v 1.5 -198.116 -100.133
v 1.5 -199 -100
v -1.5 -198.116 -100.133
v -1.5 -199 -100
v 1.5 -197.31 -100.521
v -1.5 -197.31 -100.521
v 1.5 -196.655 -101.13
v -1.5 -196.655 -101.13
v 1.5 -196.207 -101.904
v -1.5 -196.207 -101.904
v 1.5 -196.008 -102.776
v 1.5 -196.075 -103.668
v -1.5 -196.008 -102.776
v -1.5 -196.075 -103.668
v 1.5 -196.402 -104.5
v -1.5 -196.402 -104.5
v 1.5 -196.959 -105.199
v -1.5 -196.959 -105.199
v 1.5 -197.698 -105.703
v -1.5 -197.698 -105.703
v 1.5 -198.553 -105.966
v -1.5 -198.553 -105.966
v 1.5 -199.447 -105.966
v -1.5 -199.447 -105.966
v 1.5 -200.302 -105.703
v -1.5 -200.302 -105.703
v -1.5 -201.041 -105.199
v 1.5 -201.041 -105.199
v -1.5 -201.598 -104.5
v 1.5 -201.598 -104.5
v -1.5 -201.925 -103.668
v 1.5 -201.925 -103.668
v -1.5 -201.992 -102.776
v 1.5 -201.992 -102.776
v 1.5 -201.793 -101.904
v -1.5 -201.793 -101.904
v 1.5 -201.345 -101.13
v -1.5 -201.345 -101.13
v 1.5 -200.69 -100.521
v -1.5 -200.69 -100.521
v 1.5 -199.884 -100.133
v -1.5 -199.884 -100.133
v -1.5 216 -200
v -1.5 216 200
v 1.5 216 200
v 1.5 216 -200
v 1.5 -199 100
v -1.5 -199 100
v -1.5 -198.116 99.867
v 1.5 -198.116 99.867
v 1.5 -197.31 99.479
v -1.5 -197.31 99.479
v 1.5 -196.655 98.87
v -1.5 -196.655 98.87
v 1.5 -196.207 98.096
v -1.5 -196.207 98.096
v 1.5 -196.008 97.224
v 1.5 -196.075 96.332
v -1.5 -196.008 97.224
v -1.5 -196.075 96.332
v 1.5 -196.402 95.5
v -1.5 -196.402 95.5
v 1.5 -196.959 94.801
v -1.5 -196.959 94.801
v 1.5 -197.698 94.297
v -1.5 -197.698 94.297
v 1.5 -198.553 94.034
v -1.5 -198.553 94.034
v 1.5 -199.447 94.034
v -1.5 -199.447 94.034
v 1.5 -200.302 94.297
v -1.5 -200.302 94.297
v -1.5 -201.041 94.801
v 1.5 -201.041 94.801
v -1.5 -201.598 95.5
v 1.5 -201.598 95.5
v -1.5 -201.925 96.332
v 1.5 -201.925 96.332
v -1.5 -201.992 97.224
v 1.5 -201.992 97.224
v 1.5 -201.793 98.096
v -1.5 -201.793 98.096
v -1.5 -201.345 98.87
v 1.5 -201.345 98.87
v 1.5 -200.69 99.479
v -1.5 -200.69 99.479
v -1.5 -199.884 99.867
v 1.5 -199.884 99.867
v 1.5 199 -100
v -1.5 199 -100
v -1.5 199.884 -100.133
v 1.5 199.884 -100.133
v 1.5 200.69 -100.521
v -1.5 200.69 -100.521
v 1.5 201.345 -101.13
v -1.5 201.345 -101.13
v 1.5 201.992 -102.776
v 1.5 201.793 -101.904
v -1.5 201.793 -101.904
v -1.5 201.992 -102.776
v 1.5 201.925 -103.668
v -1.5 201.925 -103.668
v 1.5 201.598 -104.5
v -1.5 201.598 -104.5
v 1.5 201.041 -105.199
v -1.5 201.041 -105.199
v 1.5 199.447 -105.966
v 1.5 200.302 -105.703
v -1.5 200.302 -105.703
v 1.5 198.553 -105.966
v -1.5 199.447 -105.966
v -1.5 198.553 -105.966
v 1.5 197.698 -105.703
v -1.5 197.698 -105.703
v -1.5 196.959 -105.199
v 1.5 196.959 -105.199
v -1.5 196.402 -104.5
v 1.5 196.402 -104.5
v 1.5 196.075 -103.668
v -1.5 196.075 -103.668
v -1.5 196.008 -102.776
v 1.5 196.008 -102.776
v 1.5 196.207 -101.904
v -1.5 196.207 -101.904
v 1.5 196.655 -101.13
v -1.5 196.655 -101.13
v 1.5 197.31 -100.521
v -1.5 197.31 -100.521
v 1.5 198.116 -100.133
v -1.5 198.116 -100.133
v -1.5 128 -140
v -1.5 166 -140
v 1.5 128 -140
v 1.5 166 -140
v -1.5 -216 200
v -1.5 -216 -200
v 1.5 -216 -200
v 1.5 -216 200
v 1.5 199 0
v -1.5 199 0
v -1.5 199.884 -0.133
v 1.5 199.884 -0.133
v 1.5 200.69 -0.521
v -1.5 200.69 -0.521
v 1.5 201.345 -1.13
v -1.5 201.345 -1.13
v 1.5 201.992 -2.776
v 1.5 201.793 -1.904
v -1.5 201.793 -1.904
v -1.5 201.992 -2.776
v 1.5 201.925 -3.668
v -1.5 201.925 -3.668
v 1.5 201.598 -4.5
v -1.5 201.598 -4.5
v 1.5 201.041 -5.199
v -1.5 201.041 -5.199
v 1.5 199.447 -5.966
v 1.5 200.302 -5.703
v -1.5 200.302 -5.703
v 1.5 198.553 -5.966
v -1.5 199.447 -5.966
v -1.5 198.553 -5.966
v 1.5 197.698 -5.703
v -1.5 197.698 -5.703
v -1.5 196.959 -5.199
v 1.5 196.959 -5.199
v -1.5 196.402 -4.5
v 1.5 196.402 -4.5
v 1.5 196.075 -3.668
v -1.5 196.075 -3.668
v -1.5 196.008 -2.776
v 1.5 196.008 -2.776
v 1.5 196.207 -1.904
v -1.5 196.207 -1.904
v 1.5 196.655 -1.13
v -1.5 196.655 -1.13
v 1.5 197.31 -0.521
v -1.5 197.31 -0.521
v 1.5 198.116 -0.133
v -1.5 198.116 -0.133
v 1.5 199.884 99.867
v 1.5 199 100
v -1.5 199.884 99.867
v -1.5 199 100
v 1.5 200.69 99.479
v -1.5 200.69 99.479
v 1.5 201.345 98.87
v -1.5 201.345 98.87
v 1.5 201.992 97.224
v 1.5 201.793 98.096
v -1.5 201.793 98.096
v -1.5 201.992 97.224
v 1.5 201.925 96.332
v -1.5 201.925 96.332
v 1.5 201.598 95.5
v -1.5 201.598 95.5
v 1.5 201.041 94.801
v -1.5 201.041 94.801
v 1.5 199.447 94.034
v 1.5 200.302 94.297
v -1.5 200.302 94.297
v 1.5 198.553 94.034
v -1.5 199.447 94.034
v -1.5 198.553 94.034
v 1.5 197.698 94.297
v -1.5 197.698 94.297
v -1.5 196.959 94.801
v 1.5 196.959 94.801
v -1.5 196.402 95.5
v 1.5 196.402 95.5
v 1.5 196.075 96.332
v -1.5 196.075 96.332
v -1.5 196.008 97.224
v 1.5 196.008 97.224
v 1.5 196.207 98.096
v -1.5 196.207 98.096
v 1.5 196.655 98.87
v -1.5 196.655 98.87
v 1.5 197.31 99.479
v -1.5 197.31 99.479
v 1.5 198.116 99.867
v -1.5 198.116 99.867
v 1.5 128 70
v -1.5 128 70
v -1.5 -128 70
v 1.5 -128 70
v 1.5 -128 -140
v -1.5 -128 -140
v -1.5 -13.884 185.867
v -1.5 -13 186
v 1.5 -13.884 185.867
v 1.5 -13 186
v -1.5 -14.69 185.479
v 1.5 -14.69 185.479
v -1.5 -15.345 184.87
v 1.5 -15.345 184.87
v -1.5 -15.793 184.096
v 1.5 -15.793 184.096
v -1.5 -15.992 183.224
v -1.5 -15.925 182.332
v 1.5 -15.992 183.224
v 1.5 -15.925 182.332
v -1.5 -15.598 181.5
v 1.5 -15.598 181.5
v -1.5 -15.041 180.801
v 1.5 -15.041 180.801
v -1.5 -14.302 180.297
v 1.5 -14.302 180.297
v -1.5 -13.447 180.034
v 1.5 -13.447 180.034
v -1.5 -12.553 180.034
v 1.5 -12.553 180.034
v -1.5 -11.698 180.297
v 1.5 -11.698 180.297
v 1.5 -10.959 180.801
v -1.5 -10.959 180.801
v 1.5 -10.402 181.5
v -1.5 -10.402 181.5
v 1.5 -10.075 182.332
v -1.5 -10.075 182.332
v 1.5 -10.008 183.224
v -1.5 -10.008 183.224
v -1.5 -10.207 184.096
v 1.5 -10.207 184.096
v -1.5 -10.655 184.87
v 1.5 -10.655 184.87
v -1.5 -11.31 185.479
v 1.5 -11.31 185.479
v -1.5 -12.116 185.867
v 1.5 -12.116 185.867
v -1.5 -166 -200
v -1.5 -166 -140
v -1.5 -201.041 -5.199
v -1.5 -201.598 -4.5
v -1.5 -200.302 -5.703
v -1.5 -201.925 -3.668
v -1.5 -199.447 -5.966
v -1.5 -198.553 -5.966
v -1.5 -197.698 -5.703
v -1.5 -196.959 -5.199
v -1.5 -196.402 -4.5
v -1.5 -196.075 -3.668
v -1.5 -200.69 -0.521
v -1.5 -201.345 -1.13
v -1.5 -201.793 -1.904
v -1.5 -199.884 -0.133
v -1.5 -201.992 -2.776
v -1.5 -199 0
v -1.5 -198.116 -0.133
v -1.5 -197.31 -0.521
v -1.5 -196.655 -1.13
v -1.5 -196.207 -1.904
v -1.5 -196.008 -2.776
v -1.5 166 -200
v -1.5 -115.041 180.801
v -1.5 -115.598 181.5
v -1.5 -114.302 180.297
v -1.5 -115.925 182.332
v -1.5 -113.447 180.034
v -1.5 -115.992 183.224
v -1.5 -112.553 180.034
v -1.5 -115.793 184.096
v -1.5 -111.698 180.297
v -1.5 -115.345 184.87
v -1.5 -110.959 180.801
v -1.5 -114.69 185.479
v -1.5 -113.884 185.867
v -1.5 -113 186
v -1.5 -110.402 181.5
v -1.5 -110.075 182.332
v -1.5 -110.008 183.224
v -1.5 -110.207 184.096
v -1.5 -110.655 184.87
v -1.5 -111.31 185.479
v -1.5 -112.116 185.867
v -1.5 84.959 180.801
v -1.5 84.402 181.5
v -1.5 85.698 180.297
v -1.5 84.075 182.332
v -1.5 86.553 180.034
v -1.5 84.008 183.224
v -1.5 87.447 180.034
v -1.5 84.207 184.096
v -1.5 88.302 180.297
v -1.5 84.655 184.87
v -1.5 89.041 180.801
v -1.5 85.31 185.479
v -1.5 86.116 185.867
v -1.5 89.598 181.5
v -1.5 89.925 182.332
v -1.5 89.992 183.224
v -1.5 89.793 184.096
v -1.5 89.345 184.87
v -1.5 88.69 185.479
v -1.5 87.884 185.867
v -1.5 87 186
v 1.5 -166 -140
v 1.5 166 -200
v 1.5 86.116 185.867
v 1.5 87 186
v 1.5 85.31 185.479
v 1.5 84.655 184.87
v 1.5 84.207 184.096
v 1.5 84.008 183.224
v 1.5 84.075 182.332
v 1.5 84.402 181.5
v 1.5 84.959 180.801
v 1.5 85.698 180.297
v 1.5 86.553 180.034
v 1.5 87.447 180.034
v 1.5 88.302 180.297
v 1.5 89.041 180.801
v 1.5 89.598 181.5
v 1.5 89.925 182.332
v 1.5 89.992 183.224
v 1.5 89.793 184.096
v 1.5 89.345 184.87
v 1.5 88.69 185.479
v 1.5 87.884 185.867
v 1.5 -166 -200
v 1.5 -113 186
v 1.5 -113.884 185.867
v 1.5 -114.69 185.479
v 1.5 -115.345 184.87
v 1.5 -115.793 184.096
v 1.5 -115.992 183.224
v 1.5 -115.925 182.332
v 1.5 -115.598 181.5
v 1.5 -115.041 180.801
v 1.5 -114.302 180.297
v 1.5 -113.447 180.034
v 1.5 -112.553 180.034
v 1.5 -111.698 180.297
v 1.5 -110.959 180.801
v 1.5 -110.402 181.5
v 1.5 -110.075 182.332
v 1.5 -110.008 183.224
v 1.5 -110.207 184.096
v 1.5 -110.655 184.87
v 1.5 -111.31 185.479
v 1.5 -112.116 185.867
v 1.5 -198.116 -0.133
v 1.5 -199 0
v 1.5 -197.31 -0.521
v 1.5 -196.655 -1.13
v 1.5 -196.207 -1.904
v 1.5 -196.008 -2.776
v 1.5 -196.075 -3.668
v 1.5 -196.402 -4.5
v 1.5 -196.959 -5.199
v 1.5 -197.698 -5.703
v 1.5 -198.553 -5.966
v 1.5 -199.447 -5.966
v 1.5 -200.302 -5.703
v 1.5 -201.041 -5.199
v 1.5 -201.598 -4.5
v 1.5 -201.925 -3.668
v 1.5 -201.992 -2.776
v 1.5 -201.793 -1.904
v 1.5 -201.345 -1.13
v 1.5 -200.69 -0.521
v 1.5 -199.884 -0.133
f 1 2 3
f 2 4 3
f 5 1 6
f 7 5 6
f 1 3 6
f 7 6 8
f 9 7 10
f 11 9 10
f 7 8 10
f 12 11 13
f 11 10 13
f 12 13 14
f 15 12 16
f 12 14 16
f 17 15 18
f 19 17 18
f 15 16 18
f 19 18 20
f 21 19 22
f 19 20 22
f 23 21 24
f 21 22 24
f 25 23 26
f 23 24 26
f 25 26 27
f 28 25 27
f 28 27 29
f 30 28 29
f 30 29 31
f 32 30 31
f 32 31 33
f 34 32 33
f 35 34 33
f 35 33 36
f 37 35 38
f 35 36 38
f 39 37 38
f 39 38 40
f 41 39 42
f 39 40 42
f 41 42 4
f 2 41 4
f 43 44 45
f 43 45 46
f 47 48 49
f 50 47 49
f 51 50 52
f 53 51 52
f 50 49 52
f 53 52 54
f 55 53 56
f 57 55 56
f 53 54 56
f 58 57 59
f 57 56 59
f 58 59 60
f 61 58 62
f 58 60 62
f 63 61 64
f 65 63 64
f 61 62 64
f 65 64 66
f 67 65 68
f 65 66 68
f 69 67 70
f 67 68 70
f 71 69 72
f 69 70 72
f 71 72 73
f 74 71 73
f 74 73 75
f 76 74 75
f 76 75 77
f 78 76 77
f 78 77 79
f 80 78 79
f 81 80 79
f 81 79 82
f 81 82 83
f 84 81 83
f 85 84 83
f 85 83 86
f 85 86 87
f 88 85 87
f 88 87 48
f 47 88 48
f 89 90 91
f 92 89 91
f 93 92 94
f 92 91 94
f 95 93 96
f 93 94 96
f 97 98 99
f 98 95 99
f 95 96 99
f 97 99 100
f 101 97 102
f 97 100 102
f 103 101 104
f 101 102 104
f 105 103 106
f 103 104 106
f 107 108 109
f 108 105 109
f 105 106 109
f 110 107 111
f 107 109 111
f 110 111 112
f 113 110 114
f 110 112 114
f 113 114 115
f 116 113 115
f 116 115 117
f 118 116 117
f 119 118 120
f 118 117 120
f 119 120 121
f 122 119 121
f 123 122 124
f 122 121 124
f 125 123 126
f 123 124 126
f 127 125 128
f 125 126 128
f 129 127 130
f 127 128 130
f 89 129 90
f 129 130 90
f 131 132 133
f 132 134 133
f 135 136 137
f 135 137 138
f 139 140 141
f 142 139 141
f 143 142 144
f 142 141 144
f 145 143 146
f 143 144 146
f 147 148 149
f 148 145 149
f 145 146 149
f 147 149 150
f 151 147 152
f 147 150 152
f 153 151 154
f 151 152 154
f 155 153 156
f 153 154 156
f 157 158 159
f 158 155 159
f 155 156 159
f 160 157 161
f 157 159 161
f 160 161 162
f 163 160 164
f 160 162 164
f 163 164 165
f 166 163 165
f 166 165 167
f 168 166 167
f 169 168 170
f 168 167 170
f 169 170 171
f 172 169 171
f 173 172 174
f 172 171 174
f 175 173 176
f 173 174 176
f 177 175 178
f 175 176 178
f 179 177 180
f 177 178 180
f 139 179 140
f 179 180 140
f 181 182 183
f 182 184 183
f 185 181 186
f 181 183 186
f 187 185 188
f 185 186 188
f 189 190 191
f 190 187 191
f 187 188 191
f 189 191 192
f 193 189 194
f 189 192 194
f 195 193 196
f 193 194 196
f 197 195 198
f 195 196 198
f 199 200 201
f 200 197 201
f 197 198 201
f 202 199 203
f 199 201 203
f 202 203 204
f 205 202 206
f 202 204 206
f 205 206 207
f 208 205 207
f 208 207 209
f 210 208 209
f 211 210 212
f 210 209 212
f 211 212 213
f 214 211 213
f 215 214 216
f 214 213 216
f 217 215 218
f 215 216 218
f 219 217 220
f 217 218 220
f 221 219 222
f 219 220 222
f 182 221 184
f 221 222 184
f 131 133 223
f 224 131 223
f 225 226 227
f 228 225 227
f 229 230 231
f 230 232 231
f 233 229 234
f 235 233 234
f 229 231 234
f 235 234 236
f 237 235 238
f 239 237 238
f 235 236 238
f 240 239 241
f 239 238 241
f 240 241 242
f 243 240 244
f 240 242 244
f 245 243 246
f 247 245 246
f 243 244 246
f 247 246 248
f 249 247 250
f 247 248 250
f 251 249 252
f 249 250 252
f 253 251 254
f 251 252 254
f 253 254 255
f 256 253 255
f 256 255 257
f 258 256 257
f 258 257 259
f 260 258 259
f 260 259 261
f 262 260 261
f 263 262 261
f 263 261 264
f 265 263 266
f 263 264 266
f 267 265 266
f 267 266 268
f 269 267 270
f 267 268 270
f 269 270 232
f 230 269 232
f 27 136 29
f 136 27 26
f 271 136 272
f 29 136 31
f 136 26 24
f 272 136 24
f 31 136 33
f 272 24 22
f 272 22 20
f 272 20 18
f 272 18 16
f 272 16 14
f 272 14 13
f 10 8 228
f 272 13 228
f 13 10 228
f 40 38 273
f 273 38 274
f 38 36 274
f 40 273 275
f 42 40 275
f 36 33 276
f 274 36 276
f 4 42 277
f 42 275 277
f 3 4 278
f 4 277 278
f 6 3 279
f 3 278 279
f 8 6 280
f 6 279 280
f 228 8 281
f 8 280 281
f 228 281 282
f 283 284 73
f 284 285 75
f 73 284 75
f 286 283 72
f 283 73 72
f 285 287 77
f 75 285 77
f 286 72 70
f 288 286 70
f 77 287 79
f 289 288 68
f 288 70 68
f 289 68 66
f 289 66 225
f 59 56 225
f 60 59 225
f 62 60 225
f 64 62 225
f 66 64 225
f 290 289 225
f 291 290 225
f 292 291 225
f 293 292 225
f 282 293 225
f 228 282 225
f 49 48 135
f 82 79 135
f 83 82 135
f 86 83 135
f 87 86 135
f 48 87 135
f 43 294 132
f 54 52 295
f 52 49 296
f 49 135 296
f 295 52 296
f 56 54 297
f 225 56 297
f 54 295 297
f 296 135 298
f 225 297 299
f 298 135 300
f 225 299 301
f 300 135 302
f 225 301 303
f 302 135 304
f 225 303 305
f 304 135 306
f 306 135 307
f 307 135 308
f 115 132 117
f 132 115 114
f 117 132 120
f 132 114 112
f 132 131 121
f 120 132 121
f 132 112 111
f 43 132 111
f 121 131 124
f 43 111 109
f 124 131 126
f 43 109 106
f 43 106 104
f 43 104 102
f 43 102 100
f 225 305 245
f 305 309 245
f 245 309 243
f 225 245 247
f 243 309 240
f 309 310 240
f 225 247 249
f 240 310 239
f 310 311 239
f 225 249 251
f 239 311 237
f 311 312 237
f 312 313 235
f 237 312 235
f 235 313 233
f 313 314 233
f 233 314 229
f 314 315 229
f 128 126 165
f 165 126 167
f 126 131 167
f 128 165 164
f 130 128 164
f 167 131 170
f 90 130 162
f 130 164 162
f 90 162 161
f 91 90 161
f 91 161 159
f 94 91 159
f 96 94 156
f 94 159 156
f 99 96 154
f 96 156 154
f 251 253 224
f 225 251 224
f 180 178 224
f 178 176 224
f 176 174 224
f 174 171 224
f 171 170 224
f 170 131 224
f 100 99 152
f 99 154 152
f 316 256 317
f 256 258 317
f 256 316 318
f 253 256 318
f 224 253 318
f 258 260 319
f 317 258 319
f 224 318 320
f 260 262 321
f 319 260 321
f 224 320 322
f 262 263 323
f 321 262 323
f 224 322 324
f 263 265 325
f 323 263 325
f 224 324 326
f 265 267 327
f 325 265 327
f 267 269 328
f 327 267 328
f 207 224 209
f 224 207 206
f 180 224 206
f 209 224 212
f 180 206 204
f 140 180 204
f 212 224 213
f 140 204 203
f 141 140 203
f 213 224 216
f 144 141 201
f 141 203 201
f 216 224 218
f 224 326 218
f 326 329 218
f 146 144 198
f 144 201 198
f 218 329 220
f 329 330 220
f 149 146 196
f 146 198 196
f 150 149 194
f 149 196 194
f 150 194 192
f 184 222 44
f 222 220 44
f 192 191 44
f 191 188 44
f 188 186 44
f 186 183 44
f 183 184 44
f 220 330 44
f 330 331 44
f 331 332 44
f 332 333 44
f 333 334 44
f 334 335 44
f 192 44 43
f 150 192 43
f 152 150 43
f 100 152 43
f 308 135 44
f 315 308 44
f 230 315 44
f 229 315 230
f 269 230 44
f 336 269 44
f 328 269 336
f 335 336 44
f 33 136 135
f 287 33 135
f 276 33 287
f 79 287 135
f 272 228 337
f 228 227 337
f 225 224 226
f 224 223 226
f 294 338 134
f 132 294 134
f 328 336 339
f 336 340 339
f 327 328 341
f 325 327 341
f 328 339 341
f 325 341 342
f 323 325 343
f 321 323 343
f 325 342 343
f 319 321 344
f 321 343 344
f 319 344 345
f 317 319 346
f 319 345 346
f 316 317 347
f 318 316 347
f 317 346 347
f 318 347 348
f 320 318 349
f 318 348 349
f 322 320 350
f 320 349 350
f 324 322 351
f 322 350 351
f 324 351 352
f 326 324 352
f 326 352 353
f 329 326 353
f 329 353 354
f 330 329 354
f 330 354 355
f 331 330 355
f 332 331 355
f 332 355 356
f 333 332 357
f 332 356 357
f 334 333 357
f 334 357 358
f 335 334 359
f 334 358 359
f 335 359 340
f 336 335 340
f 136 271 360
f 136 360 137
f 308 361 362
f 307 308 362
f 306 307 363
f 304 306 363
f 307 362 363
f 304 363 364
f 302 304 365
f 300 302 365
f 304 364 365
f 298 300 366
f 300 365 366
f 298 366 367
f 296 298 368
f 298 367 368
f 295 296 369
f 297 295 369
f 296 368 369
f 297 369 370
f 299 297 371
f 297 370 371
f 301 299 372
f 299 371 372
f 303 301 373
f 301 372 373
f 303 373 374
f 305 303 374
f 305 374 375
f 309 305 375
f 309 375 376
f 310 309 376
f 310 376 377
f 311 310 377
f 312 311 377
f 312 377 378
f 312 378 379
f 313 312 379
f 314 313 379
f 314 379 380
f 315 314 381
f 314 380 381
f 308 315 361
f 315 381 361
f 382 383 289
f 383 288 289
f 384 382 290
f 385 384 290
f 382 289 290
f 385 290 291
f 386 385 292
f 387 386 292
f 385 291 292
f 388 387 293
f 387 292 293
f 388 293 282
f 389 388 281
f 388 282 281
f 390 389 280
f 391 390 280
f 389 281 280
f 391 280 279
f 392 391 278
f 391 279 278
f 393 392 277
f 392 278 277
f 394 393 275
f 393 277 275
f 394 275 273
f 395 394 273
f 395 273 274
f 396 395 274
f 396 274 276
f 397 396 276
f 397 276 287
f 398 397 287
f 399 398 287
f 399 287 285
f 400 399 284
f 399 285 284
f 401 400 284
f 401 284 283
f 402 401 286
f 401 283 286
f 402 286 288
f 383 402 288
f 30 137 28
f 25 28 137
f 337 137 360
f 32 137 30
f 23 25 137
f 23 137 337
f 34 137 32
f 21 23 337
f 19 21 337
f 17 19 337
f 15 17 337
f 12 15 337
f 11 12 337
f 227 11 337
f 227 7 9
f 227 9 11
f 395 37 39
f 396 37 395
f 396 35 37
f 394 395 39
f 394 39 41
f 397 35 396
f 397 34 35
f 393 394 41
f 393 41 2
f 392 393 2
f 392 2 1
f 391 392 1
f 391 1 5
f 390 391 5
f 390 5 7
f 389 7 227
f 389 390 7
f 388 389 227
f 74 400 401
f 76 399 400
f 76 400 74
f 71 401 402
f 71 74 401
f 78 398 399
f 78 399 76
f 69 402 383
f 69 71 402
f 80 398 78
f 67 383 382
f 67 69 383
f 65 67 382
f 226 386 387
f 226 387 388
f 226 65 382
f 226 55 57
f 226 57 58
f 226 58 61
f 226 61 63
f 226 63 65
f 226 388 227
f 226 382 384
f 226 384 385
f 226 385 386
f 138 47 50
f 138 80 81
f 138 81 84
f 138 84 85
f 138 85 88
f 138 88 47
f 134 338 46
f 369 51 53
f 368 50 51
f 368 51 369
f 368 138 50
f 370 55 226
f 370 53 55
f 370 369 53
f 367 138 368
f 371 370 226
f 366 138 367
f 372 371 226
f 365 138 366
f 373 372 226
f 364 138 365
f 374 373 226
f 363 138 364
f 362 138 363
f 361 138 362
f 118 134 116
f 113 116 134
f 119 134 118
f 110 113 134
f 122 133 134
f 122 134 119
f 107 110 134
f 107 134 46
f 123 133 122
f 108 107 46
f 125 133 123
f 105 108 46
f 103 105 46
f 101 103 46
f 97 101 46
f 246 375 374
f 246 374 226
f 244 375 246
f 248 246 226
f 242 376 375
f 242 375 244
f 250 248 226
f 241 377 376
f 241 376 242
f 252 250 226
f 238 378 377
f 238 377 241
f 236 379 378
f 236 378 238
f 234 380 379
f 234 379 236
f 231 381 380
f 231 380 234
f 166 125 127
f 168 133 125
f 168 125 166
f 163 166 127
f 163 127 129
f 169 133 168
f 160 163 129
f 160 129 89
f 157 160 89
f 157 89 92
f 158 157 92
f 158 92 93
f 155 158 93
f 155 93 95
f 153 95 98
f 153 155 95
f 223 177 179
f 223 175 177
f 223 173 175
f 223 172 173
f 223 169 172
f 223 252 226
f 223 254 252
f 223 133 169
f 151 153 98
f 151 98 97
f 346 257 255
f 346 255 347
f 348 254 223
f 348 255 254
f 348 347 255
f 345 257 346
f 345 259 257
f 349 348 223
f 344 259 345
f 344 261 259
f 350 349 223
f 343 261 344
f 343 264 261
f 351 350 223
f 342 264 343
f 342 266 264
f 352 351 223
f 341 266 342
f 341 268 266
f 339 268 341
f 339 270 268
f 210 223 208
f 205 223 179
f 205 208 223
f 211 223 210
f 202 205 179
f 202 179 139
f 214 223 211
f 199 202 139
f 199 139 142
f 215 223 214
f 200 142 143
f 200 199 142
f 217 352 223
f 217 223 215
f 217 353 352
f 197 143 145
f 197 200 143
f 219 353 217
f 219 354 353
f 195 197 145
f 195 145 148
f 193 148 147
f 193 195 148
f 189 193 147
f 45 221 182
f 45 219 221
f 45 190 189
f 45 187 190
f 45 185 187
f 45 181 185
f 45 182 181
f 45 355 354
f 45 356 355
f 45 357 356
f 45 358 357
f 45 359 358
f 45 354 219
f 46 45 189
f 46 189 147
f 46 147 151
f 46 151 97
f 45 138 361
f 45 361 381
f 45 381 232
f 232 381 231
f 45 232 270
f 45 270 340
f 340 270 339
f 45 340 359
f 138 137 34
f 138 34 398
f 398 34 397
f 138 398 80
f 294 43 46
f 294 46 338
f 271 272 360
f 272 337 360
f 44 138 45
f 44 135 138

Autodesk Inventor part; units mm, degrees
ref_plane "YZ Plane" through (0, 0, 0) normal (1, 0, 0) x (0, 1, 0)
ref_plane "XZ Plane" through (0, 0, 0) normal (0, 1, 0) x (-1, 0, 0)
ref_plane "XY Plane" through (0, 0, 0) normal (0, 0, 1) x (1, 0, 0)
sketch "Sketch1" plane through (0, 0, 0) normal (1, 0, 0) x (0, 1, 0)
  line L0 (-216, 200) -> (216, 200)
  line L1 (216, 200) -> (216, -200)
  line L2 (216, -200) -> (-216, -200)
  line L3 (-216, -200) -> (-216, 200)
  line L4 (-216, 200) -> (216, -200) construction
  line L5 (216, 200) -> (-216, -200) construction
  point P0 (0, 0)
  dimension "d0" = 400
  dimension "d1" = 432
extrude "Extrusion1" add sketch "Sketch1" along normal mid plane 3
sketch "Sketch2" plane through (1.5, 0, 0) normal (1, 0, 0) x (0, 0, -1)
  line L0 (200, 216) -> (-200, 216) projected
  line L1 (-200, -216) -> (200, -216) projected
  line L2 (200, -216) -> (200, 216) projected
  line L3 (200, 166) -> (140, 166)
  line L4 (140, 166) -> (140, 128)
  line L5 (140, 128) -> (-70, 128)
  line L6 (-70, 128) -> (-70, -128)
  line L7 (-70, -128) -> (140, -128)
  line L8 (140, -128) -> (140, -166)
  line L9 (140, -166) -> (200, -166)
  point P0 (0, 0)
  dimension "d6" = 50
  dimension "d7" = 50
  dimension "d8" = 60
  dimension "d9" = 38
  dimension "d10" = 270
extrude "Extrusion2" cut sketch "Sketch2" against normal blind 3
sketch "Sketch3" plane through (-1.5, 0, 0) normal (-1, 0, 0) x (0, 0, 1)
  circle A0 centre (97, -199) radius 3
  circle A1 centre (-3, -199) radius 3
  circle A2 centre (-103, -199) radius 3
  line L0 (-200, -216) -> (200, -216) projected
  line L1 (200, -216) -> (200, 216) projected
  point P0 (0, 0)
  dimension "d15" = 6
  dimension "d16" = 6
  dimension "d17" = 6
  dimension "d18" = 17
  dimension "d19" = 103
  dimension "d20" = 100
  dimension "d21" = 100
extrude "Extrusion3" cut sketch "Sketch3" against normal blind 3
mirror "Mirror1" about plane through (0, 0, 0) normal (0, 1, 0) of "Extrusion3"
sketch "Sketch4" plane through (-1.5, 0, 0) normal (-1, 0, 0) x (0, 0, 1)
  circle A0 centre (183, 87) radius 2.5 projected
  circle A1 centre (183, -13) radius 2.5 projected
  circle A2 centre (183, -113) radius 2.5 projected
  point P0 (0, 0)
hole "Hole1" at (-1.5, 87, 183) at (-1.5, -13, 183) at (-1.5, -113, 183) direction (1, 0, 0) diameter 6 depth 14.2 tip angle 118
equation "\"d6\" = d7"
properties part number "HCMUTE-CDT23-KXL_A03" material "PMMA Plastic"
